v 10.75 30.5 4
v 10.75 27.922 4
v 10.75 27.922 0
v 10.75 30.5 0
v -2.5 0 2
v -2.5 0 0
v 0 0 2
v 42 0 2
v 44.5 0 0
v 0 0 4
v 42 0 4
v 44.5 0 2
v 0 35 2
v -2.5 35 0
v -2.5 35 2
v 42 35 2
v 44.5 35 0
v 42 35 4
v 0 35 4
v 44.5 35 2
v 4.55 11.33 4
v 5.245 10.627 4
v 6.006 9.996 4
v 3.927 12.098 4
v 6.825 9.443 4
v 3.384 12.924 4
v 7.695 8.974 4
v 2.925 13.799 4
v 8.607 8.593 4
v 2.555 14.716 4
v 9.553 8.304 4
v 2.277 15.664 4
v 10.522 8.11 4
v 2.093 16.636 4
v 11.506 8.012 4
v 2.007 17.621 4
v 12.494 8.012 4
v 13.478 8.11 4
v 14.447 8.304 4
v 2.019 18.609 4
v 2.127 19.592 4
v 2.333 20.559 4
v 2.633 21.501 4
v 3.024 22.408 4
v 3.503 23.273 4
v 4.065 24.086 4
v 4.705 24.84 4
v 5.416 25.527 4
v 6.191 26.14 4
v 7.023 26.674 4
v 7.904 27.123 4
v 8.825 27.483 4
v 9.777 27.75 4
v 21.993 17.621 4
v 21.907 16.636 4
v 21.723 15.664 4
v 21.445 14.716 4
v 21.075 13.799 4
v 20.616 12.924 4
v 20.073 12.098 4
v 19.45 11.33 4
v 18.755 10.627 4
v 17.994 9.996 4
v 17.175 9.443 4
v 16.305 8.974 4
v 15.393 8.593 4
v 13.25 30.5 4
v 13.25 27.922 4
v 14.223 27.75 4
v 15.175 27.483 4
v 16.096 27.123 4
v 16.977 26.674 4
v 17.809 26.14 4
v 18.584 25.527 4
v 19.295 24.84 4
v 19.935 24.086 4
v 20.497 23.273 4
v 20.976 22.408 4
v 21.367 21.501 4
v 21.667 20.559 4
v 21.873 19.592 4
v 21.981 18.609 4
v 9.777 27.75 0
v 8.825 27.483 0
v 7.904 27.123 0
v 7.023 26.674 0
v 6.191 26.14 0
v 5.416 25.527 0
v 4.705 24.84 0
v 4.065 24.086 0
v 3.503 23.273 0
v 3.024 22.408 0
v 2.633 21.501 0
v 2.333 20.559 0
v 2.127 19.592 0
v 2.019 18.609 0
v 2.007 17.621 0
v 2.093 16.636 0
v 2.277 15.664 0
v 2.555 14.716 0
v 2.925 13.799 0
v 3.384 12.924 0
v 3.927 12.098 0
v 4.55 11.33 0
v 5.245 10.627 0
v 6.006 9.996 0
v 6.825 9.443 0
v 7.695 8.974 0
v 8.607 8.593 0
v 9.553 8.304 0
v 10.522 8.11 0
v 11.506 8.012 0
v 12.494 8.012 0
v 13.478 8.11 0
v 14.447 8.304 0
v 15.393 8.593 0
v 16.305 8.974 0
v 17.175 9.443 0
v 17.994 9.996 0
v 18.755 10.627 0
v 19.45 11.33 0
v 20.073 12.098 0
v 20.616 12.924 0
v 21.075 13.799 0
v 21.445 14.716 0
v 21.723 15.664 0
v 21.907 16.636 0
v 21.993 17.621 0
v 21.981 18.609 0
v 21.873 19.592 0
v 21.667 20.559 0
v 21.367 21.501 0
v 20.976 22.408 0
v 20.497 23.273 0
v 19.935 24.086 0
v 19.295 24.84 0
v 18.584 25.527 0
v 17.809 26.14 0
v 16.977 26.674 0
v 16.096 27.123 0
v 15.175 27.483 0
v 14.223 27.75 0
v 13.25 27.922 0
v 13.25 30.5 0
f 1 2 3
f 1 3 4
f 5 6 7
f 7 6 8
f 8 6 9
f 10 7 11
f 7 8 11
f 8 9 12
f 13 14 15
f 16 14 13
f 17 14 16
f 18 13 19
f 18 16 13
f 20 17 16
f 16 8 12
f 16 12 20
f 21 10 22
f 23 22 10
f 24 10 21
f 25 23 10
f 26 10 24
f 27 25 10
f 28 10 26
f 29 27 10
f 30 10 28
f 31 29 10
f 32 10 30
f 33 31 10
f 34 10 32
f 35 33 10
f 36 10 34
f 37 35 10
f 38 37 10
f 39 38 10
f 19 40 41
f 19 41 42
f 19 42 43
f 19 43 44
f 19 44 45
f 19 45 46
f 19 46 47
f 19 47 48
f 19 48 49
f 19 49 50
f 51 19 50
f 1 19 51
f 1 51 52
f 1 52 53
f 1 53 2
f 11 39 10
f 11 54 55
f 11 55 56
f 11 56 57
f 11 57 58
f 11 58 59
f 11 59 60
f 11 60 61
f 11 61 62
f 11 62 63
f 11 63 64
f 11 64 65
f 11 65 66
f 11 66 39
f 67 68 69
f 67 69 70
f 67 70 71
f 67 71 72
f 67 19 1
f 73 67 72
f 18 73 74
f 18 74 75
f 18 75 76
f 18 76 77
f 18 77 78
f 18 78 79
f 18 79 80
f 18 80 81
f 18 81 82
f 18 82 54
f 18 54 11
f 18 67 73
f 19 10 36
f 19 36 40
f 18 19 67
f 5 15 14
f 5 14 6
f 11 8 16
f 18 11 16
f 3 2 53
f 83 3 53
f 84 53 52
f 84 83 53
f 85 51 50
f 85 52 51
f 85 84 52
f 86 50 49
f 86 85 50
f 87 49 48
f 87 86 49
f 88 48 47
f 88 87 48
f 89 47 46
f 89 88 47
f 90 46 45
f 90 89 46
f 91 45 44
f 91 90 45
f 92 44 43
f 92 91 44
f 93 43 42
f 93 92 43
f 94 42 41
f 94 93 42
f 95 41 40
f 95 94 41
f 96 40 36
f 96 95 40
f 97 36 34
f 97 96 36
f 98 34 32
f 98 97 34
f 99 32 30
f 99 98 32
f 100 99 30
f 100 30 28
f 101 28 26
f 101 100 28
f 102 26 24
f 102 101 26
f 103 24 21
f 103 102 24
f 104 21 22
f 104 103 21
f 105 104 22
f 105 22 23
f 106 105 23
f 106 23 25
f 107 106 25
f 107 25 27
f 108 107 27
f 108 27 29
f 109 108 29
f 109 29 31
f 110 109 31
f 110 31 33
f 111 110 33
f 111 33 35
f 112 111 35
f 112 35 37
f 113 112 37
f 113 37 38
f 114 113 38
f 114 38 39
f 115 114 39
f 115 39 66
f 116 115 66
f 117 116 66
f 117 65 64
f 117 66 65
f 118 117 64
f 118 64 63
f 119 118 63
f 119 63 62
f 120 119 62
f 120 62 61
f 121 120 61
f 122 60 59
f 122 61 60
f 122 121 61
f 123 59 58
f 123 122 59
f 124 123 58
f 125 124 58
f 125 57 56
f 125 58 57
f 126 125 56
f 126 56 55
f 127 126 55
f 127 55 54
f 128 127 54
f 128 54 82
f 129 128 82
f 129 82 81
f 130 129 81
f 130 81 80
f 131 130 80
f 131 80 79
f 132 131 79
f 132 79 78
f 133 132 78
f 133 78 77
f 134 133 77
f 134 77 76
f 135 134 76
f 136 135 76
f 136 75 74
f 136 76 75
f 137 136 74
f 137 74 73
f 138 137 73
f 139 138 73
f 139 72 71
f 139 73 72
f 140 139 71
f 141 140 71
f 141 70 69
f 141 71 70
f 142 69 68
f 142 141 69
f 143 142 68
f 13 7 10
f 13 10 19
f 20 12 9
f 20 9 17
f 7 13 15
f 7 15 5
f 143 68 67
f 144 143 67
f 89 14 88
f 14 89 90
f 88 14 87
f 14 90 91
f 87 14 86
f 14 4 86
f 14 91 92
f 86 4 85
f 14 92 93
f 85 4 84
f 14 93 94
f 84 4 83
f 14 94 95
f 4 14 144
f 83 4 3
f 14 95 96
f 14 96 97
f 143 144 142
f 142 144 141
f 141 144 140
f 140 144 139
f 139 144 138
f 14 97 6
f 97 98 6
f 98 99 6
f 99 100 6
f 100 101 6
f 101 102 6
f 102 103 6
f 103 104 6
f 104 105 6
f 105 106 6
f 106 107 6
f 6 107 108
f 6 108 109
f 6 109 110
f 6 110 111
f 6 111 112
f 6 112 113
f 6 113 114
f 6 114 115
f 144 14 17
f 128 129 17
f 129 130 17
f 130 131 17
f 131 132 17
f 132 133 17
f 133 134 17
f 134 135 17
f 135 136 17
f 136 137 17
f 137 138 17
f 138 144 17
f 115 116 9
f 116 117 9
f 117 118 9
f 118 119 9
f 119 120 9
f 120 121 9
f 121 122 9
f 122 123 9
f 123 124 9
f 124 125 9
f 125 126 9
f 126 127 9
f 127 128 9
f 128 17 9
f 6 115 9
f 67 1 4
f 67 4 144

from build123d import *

# Parameters (mm, degrees)
SKETCH_W     = 42
SKETCH_H     = 35
SKETCH_R     = 10
PAD_DEPTH    = 4
SKETCH001_W  = 2.5
SKETCH001_H  = 6
POCKET_DEPTH = 5
SKETCH002_W  = 35
SKETCH002_H  = 2
PAD001_DEPTH = 2.5
SKETCH003_W  = 35
SKETCH003_H  = 2
PAD002_DEPTH = 2.5


with BuildPart() as part:
    # Sketch → Pad (new body)
    with BuildSketch(Plane.XY):
        with Locations((21, 17.5)):
            Rectangle(SKETCH_W, SKETCH_H)
        with Locations((12, 18)):
            Circle(SKETCH_R, mode=Mode.SUBTRACT)
    extrude(amount=PAD_DEPTH)

    # Sketch001 (on Face7 of Pad) → Pocket (cut)
    with BuildSketch(Plane.XY.offset(4)):
        with Locations((12, 27.5)):
            Rectangle(SKETCH001_W, SKETCH001_H)
    extrude(amount=-POCKET_DEPTH, mode=Mode.SUBTRACT)

    # Sketch002 (on Face3 of Pocket) → Pad001 (join)
    with BuildSketch(Plane.YZ.offset(42)):
        with Locations((17.5, 1)):
            Rectangle(SKETCH002_W, SKETCH002_H)
    extrude(amount=PAD001_DEPTH)

    # Sketch003 (on Face2 of Pad001) → Pad002 (join)
    with BuildSketch(Plane(origin=(0, 0, 0), x_dir=(0, -1, 0), z_dir=(-1, 0, 0))):
        with Locations((-17.5, 1)):
            Rectangle(SKETCH003_W, SKETCH003_H)
    extrude(amount=PAD002_DEPTH)


solid = part.part
